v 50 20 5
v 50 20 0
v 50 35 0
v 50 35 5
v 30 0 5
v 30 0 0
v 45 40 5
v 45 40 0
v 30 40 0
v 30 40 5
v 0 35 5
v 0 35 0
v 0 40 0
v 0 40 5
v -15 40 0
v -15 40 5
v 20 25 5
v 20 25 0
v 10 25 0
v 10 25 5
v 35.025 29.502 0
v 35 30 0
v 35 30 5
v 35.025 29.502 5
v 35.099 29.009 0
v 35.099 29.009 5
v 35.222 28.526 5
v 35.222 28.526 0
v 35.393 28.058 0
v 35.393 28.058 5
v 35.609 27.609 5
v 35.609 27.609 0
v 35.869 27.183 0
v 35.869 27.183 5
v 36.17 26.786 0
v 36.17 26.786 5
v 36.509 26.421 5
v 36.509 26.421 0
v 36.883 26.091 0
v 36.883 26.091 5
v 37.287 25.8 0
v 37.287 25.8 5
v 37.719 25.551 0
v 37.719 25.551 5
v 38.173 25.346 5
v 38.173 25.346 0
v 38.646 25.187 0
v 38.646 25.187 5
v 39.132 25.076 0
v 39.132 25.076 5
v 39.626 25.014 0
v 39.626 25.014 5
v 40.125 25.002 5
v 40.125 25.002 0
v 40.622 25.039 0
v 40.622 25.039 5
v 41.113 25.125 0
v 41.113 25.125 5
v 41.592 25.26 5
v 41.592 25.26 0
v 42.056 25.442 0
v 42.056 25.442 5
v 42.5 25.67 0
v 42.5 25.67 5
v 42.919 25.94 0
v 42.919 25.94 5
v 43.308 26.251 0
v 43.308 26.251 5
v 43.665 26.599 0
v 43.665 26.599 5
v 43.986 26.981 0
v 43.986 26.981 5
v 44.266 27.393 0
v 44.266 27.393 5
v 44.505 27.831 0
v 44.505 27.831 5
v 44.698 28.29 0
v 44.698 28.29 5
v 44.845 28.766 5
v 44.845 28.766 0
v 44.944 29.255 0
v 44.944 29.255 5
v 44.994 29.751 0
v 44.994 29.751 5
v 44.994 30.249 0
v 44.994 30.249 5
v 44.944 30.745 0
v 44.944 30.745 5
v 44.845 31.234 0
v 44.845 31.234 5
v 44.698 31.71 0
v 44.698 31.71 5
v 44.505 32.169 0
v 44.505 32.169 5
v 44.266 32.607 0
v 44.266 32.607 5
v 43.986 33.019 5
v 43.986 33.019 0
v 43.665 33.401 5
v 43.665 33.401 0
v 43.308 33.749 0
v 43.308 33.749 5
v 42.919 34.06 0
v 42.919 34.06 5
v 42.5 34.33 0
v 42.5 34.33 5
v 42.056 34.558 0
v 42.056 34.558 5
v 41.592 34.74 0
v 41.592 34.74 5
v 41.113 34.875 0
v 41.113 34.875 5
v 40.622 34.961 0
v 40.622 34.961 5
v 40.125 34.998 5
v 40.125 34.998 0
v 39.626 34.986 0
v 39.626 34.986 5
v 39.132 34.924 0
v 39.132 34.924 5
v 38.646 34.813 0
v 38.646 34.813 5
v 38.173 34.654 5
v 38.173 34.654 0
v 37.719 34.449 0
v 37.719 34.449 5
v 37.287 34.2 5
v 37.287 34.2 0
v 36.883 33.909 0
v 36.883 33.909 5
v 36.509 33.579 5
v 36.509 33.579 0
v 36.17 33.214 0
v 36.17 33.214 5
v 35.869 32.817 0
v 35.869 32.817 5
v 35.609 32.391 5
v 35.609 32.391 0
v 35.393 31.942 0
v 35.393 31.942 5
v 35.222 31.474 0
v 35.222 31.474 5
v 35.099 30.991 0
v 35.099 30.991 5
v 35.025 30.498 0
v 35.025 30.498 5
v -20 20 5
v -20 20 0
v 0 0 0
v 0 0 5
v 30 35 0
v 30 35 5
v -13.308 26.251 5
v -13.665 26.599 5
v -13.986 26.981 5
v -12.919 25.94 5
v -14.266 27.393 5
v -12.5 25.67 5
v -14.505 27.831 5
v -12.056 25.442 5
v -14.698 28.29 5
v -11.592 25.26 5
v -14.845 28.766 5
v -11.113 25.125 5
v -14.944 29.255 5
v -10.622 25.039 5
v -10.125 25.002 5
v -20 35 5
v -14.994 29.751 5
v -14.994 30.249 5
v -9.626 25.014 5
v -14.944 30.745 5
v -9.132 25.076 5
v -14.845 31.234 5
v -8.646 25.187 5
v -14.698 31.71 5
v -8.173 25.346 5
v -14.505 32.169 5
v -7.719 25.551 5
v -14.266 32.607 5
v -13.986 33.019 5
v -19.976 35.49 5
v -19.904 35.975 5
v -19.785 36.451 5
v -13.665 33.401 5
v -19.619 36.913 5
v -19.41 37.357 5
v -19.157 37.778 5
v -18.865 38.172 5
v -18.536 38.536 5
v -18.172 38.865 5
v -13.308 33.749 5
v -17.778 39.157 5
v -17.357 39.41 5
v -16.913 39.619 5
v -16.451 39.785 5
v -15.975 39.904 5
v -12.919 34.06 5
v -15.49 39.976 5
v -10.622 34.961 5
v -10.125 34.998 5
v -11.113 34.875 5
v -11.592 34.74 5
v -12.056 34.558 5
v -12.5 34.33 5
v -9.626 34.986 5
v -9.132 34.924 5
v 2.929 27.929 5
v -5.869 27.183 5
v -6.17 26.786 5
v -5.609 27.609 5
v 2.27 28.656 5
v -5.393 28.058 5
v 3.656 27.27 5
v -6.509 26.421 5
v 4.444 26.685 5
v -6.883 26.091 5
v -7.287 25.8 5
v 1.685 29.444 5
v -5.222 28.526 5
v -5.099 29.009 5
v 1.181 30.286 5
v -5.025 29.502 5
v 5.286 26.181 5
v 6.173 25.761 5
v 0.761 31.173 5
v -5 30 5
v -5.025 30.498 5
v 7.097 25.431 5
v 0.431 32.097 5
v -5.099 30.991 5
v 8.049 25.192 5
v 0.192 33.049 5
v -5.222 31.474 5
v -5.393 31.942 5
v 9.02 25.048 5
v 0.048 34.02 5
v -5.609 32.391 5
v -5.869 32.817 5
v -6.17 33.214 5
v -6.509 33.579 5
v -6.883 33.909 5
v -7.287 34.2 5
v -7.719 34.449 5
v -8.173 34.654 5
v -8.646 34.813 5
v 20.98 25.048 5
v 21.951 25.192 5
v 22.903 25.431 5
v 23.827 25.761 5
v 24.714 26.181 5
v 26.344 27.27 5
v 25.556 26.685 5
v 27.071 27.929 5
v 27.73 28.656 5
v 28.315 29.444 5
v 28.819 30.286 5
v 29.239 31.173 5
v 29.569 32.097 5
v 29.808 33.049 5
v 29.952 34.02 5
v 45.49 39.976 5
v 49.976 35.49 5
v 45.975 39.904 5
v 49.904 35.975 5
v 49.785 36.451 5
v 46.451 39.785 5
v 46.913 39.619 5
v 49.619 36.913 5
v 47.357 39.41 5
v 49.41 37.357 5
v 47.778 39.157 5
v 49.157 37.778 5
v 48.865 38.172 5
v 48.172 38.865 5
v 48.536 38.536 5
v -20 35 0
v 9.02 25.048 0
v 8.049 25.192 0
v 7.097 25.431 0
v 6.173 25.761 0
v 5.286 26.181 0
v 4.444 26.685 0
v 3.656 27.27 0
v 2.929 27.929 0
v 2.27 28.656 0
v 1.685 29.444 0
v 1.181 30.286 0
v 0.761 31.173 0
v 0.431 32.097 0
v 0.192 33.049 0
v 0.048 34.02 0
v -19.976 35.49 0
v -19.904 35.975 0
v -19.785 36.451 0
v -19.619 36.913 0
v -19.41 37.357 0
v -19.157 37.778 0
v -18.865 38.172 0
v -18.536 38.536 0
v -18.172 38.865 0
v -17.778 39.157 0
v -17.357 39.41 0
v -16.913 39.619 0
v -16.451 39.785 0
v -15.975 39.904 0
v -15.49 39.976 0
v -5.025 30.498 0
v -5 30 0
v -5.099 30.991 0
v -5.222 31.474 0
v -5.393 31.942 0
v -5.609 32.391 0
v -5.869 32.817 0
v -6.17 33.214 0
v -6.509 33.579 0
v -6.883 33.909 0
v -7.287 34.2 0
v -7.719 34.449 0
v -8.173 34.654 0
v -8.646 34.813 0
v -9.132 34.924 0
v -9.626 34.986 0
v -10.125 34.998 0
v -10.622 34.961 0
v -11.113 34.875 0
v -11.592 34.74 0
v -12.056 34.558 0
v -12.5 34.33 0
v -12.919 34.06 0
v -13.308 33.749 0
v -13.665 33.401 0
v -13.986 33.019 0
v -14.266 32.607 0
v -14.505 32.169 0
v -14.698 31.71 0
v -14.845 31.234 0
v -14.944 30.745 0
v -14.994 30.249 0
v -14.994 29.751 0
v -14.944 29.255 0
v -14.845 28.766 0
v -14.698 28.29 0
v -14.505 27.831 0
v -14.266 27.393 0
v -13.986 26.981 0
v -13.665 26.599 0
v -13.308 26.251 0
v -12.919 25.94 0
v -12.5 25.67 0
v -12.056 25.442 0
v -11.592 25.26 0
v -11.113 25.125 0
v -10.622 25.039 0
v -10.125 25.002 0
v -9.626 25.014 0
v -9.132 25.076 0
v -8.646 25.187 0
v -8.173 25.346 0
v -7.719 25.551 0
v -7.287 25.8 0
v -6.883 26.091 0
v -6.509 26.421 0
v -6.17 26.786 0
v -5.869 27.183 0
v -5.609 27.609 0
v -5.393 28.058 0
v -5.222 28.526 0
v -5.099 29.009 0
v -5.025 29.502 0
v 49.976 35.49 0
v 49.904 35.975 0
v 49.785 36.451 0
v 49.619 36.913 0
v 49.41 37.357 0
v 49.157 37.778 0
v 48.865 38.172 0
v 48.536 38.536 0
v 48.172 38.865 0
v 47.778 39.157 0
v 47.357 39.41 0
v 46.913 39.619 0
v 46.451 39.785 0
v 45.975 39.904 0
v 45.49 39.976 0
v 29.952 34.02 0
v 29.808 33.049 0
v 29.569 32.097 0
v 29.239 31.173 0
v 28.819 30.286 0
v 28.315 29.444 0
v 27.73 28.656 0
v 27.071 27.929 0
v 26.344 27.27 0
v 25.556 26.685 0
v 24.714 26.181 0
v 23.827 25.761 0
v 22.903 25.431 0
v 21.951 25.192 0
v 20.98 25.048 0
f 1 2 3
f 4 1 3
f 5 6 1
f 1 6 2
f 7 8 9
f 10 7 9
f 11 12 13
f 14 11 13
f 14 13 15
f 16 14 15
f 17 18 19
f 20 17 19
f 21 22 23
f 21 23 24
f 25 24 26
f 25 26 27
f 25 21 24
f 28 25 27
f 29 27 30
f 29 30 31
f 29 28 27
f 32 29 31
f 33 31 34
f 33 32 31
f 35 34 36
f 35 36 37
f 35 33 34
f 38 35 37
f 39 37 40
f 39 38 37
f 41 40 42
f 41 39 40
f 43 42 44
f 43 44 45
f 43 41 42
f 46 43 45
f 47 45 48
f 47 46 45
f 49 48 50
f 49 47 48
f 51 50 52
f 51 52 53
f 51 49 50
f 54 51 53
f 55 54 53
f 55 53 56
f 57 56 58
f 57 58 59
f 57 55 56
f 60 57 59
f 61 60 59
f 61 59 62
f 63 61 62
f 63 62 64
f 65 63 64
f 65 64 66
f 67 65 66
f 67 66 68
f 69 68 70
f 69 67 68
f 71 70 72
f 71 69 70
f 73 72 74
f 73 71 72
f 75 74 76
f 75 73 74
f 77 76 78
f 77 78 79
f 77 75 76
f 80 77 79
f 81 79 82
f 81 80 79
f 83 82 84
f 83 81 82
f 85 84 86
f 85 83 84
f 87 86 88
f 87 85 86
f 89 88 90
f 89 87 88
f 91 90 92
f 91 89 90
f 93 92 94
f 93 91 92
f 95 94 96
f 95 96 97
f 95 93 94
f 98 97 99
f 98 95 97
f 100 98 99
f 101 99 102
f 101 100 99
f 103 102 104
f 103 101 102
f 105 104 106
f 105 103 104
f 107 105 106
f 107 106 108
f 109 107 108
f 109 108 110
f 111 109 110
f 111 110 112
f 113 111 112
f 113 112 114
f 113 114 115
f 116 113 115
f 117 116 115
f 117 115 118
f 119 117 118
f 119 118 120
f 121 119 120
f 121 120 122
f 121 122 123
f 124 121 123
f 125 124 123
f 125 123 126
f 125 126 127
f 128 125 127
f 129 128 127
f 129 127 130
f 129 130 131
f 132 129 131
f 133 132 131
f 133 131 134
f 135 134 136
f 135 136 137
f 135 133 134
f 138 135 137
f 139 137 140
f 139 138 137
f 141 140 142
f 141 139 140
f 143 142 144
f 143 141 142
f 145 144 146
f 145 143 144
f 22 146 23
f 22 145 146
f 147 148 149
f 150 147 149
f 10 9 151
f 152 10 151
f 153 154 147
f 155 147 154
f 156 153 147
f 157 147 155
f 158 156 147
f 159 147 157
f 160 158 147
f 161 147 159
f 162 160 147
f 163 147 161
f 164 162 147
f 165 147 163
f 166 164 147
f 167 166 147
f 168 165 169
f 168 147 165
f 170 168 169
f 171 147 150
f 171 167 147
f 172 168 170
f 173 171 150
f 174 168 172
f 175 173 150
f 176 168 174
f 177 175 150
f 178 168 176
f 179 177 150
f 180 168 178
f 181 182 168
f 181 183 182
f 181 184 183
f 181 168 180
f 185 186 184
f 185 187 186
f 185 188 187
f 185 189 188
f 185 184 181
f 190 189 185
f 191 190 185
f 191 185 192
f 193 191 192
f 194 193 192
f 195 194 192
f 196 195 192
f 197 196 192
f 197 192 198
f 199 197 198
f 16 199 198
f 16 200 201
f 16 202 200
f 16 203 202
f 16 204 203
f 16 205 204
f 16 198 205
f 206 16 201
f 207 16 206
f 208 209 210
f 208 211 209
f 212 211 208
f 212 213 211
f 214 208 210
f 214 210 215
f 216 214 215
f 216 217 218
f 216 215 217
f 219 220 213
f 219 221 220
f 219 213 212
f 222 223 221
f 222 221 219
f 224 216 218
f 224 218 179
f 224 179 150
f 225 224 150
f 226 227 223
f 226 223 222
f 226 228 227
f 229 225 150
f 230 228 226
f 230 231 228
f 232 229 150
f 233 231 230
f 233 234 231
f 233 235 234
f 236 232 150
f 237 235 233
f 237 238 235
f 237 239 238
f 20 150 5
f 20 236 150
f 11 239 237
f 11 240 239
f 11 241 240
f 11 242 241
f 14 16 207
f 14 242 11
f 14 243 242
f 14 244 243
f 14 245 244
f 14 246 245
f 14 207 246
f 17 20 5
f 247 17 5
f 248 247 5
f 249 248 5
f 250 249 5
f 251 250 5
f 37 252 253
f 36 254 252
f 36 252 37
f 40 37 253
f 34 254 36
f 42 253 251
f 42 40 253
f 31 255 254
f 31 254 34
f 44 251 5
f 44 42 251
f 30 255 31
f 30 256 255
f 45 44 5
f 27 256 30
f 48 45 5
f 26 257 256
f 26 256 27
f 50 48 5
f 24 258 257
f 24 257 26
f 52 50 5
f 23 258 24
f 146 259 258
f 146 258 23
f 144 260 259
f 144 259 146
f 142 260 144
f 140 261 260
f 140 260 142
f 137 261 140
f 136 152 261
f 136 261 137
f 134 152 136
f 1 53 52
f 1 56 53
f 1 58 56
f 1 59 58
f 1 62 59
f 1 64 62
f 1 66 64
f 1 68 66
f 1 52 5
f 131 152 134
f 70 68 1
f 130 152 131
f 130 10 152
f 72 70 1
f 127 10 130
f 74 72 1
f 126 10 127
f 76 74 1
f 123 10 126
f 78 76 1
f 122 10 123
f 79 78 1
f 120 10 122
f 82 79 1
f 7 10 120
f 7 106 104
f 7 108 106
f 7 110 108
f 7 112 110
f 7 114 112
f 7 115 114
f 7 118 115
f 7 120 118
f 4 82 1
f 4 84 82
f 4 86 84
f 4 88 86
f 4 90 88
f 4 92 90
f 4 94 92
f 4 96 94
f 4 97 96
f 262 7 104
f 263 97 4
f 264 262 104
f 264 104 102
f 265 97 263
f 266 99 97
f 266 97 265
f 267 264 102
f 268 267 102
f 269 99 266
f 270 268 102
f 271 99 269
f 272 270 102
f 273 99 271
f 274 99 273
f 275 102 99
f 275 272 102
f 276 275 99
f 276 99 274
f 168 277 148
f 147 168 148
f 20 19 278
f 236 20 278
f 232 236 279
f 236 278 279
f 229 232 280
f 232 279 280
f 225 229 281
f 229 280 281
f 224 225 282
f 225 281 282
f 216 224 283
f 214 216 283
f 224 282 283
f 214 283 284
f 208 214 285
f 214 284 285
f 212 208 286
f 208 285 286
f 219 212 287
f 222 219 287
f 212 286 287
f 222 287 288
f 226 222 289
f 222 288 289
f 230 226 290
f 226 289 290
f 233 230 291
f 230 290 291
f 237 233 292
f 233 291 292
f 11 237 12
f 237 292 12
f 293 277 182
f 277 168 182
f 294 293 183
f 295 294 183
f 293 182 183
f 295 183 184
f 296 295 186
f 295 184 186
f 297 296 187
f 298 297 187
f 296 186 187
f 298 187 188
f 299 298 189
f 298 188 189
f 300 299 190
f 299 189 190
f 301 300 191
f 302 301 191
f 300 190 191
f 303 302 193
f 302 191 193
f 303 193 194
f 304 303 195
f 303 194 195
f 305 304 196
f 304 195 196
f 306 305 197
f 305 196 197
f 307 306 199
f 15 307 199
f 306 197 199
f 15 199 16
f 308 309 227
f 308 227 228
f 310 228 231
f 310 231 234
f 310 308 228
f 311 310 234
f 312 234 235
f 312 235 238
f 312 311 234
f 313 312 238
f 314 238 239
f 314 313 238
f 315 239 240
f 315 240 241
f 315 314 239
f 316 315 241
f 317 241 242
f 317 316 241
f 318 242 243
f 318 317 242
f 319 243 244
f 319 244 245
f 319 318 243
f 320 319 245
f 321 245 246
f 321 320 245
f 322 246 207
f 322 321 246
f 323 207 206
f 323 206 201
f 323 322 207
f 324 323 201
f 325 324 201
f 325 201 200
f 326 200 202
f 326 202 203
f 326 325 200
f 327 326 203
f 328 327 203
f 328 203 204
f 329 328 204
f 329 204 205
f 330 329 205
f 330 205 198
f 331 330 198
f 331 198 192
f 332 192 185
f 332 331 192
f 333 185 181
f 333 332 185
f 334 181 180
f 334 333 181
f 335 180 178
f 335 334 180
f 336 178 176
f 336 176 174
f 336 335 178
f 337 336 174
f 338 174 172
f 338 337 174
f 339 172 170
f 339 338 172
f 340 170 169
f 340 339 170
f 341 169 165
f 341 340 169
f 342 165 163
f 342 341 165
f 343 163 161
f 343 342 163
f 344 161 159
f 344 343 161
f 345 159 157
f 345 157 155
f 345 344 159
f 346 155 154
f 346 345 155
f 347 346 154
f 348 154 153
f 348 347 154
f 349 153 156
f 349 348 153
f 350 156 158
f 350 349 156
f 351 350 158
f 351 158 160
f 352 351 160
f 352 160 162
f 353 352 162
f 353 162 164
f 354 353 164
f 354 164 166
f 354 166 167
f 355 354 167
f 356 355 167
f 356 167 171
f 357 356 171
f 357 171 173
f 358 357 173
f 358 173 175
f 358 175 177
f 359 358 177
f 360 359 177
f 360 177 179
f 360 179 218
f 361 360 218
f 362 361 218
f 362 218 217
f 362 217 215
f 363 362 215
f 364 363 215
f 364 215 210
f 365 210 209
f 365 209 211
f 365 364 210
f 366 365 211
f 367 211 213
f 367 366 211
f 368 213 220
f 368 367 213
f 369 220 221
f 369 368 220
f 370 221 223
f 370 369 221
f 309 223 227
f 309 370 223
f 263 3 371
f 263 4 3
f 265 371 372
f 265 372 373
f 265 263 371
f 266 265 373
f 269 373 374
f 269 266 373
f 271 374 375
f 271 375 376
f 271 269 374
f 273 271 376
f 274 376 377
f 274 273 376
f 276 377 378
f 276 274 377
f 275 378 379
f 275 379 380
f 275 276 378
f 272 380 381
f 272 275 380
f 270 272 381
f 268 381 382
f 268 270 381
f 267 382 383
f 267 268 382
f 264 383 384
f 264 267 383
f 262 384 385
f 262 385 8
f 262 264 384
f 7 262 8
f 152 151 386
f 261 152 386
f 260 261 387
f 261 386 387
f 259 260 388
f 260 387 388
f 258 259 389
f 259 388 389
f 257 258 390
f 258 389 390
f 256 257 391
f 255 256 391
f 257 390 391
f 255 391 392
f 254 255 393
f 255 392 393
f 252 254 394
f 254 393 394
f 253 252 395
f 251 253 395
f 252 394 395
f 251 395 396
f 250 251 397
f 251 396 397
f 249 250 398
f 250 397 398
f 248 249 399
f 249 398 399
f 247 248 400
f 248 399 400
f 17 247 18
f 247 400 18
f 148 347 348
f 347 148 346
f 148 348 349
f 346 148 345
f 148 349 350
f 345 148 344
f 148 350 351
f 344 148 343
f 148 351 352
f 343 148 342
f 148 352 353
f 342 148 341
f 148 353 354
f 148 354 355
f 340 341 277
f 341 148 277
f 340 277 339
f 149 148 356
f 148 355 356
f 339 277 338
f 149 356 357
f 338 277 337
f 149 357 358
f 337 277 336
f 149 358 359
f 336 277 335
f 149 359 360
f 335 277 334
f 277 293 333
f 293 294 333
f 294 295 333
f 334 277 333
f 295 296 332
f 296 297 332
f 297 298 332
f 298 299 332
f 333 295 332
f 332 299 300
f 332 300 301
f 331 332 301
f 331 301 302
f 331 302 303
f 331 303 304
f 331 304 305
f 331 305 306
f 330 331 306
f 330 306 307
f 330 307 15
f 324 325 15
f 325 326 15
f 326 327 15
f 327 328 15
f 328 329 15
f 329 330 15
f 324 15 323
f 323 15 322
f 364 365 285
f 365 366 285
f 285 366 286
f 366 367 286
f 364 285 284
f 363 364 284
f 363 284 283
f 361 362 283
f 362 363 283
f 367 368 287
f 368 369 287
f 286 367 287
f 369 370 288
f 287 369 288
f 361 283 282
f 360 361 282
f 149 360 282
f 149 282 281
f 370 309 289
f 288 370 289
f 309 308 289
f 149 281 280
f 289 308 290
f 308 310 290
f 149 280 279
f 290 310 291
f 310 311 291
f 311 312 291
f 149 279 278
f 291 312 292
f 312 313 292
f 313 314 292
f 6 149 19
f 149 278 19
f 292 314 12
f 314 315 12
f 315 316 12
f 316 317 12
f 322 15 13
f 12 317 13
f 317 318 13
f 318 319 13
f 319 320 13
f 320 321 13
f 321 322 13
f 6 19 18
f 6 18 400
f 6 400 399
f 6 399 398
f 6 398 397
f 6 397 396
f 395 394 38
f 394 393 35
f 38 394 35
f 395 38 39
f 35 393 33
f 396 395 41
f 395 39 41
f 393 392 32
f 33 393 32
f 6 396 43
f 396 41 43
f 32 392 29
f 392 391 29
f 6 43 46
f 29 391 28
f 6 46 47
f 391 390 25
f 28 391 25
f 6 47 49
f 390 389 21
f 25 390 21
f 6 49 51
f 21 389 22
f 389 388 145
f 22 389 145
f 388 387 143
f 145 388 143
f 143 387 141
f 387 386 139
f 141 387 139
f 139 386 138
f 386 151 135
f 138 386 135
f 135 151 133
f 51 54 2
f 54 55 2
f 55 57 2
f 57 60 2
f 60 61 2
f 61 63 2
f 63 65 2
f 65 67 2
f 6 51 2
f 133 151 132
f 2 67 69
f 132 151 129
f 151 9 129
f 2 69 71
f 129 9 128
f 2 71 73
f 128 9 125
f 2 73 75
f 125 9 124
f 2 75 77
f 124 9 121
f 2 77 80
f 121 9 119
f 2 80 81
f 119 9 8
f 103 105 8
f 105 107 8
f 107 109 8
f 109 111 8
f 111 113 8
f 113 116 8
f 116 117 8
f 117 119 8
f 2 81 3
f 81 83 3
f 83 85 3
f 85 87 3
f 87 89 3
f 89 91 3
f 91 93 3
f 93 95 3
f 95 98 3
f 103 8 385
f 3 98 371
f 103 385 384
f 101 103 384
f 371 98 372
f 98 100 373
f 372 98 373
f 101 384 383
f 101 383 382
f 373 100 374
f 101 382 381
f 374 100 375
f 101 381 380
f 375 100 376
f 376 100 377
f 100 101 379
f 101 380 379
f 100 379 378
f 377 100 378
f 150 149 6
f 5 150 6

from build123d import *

# Parameters (mm, degrees)
SKETCH1_R           = 5
BOSS_EXTRUDE1_DEPTH = 5
FILLET1_R           = 5


with BuildPart() as part:
    # Sketch1 → Boss-Extrude1 (new body)
    with BuildSketch(Plane.XY):
        with BuildLine():
            Line((0, 0), (30, 0))
            Line((30, 0), (50, 20))
            Line((50, 20), (50, 40))
            Line((50, 40), (30, 40))
            Line((30, 40), (30, 35))
            ThreePointArc((30, 35), (27.071067812, 27.928932188), (20, 25))
            Line((20, 25), (10, 25))
            ThreePointArc((10, 25), (2.928932188, 27.928932188), (0, 35))
            Line((0, 35), (0, 40))
            Line((0, 40), (-20, 40))
            Line((-20, 40), (-20, 20))
            Line((-20, 20), (0, 0))
        make_face()
        with Locations((-10, 30)):
            Circle(SKETCH1_R, mode=Mode.SUBTRACT)
        with Locations(Location((40, 30, 0), (0, 0, 180))):
            Circle(SKETCH1_R, mode=Mode.SUBTRACT)
    extrude(amount=BOSS_EXTRUDE1_DEPTH)

    # Fillet1
    fillet1_edges = [part.edges().sort_by_distance(p)[0] for p in [
        (50, 40, 2.5),
        (-20, 40, 2.5),
    ]]
    fillet(fillet1_edges, radius=FILLET1_R)


solid = part.part
